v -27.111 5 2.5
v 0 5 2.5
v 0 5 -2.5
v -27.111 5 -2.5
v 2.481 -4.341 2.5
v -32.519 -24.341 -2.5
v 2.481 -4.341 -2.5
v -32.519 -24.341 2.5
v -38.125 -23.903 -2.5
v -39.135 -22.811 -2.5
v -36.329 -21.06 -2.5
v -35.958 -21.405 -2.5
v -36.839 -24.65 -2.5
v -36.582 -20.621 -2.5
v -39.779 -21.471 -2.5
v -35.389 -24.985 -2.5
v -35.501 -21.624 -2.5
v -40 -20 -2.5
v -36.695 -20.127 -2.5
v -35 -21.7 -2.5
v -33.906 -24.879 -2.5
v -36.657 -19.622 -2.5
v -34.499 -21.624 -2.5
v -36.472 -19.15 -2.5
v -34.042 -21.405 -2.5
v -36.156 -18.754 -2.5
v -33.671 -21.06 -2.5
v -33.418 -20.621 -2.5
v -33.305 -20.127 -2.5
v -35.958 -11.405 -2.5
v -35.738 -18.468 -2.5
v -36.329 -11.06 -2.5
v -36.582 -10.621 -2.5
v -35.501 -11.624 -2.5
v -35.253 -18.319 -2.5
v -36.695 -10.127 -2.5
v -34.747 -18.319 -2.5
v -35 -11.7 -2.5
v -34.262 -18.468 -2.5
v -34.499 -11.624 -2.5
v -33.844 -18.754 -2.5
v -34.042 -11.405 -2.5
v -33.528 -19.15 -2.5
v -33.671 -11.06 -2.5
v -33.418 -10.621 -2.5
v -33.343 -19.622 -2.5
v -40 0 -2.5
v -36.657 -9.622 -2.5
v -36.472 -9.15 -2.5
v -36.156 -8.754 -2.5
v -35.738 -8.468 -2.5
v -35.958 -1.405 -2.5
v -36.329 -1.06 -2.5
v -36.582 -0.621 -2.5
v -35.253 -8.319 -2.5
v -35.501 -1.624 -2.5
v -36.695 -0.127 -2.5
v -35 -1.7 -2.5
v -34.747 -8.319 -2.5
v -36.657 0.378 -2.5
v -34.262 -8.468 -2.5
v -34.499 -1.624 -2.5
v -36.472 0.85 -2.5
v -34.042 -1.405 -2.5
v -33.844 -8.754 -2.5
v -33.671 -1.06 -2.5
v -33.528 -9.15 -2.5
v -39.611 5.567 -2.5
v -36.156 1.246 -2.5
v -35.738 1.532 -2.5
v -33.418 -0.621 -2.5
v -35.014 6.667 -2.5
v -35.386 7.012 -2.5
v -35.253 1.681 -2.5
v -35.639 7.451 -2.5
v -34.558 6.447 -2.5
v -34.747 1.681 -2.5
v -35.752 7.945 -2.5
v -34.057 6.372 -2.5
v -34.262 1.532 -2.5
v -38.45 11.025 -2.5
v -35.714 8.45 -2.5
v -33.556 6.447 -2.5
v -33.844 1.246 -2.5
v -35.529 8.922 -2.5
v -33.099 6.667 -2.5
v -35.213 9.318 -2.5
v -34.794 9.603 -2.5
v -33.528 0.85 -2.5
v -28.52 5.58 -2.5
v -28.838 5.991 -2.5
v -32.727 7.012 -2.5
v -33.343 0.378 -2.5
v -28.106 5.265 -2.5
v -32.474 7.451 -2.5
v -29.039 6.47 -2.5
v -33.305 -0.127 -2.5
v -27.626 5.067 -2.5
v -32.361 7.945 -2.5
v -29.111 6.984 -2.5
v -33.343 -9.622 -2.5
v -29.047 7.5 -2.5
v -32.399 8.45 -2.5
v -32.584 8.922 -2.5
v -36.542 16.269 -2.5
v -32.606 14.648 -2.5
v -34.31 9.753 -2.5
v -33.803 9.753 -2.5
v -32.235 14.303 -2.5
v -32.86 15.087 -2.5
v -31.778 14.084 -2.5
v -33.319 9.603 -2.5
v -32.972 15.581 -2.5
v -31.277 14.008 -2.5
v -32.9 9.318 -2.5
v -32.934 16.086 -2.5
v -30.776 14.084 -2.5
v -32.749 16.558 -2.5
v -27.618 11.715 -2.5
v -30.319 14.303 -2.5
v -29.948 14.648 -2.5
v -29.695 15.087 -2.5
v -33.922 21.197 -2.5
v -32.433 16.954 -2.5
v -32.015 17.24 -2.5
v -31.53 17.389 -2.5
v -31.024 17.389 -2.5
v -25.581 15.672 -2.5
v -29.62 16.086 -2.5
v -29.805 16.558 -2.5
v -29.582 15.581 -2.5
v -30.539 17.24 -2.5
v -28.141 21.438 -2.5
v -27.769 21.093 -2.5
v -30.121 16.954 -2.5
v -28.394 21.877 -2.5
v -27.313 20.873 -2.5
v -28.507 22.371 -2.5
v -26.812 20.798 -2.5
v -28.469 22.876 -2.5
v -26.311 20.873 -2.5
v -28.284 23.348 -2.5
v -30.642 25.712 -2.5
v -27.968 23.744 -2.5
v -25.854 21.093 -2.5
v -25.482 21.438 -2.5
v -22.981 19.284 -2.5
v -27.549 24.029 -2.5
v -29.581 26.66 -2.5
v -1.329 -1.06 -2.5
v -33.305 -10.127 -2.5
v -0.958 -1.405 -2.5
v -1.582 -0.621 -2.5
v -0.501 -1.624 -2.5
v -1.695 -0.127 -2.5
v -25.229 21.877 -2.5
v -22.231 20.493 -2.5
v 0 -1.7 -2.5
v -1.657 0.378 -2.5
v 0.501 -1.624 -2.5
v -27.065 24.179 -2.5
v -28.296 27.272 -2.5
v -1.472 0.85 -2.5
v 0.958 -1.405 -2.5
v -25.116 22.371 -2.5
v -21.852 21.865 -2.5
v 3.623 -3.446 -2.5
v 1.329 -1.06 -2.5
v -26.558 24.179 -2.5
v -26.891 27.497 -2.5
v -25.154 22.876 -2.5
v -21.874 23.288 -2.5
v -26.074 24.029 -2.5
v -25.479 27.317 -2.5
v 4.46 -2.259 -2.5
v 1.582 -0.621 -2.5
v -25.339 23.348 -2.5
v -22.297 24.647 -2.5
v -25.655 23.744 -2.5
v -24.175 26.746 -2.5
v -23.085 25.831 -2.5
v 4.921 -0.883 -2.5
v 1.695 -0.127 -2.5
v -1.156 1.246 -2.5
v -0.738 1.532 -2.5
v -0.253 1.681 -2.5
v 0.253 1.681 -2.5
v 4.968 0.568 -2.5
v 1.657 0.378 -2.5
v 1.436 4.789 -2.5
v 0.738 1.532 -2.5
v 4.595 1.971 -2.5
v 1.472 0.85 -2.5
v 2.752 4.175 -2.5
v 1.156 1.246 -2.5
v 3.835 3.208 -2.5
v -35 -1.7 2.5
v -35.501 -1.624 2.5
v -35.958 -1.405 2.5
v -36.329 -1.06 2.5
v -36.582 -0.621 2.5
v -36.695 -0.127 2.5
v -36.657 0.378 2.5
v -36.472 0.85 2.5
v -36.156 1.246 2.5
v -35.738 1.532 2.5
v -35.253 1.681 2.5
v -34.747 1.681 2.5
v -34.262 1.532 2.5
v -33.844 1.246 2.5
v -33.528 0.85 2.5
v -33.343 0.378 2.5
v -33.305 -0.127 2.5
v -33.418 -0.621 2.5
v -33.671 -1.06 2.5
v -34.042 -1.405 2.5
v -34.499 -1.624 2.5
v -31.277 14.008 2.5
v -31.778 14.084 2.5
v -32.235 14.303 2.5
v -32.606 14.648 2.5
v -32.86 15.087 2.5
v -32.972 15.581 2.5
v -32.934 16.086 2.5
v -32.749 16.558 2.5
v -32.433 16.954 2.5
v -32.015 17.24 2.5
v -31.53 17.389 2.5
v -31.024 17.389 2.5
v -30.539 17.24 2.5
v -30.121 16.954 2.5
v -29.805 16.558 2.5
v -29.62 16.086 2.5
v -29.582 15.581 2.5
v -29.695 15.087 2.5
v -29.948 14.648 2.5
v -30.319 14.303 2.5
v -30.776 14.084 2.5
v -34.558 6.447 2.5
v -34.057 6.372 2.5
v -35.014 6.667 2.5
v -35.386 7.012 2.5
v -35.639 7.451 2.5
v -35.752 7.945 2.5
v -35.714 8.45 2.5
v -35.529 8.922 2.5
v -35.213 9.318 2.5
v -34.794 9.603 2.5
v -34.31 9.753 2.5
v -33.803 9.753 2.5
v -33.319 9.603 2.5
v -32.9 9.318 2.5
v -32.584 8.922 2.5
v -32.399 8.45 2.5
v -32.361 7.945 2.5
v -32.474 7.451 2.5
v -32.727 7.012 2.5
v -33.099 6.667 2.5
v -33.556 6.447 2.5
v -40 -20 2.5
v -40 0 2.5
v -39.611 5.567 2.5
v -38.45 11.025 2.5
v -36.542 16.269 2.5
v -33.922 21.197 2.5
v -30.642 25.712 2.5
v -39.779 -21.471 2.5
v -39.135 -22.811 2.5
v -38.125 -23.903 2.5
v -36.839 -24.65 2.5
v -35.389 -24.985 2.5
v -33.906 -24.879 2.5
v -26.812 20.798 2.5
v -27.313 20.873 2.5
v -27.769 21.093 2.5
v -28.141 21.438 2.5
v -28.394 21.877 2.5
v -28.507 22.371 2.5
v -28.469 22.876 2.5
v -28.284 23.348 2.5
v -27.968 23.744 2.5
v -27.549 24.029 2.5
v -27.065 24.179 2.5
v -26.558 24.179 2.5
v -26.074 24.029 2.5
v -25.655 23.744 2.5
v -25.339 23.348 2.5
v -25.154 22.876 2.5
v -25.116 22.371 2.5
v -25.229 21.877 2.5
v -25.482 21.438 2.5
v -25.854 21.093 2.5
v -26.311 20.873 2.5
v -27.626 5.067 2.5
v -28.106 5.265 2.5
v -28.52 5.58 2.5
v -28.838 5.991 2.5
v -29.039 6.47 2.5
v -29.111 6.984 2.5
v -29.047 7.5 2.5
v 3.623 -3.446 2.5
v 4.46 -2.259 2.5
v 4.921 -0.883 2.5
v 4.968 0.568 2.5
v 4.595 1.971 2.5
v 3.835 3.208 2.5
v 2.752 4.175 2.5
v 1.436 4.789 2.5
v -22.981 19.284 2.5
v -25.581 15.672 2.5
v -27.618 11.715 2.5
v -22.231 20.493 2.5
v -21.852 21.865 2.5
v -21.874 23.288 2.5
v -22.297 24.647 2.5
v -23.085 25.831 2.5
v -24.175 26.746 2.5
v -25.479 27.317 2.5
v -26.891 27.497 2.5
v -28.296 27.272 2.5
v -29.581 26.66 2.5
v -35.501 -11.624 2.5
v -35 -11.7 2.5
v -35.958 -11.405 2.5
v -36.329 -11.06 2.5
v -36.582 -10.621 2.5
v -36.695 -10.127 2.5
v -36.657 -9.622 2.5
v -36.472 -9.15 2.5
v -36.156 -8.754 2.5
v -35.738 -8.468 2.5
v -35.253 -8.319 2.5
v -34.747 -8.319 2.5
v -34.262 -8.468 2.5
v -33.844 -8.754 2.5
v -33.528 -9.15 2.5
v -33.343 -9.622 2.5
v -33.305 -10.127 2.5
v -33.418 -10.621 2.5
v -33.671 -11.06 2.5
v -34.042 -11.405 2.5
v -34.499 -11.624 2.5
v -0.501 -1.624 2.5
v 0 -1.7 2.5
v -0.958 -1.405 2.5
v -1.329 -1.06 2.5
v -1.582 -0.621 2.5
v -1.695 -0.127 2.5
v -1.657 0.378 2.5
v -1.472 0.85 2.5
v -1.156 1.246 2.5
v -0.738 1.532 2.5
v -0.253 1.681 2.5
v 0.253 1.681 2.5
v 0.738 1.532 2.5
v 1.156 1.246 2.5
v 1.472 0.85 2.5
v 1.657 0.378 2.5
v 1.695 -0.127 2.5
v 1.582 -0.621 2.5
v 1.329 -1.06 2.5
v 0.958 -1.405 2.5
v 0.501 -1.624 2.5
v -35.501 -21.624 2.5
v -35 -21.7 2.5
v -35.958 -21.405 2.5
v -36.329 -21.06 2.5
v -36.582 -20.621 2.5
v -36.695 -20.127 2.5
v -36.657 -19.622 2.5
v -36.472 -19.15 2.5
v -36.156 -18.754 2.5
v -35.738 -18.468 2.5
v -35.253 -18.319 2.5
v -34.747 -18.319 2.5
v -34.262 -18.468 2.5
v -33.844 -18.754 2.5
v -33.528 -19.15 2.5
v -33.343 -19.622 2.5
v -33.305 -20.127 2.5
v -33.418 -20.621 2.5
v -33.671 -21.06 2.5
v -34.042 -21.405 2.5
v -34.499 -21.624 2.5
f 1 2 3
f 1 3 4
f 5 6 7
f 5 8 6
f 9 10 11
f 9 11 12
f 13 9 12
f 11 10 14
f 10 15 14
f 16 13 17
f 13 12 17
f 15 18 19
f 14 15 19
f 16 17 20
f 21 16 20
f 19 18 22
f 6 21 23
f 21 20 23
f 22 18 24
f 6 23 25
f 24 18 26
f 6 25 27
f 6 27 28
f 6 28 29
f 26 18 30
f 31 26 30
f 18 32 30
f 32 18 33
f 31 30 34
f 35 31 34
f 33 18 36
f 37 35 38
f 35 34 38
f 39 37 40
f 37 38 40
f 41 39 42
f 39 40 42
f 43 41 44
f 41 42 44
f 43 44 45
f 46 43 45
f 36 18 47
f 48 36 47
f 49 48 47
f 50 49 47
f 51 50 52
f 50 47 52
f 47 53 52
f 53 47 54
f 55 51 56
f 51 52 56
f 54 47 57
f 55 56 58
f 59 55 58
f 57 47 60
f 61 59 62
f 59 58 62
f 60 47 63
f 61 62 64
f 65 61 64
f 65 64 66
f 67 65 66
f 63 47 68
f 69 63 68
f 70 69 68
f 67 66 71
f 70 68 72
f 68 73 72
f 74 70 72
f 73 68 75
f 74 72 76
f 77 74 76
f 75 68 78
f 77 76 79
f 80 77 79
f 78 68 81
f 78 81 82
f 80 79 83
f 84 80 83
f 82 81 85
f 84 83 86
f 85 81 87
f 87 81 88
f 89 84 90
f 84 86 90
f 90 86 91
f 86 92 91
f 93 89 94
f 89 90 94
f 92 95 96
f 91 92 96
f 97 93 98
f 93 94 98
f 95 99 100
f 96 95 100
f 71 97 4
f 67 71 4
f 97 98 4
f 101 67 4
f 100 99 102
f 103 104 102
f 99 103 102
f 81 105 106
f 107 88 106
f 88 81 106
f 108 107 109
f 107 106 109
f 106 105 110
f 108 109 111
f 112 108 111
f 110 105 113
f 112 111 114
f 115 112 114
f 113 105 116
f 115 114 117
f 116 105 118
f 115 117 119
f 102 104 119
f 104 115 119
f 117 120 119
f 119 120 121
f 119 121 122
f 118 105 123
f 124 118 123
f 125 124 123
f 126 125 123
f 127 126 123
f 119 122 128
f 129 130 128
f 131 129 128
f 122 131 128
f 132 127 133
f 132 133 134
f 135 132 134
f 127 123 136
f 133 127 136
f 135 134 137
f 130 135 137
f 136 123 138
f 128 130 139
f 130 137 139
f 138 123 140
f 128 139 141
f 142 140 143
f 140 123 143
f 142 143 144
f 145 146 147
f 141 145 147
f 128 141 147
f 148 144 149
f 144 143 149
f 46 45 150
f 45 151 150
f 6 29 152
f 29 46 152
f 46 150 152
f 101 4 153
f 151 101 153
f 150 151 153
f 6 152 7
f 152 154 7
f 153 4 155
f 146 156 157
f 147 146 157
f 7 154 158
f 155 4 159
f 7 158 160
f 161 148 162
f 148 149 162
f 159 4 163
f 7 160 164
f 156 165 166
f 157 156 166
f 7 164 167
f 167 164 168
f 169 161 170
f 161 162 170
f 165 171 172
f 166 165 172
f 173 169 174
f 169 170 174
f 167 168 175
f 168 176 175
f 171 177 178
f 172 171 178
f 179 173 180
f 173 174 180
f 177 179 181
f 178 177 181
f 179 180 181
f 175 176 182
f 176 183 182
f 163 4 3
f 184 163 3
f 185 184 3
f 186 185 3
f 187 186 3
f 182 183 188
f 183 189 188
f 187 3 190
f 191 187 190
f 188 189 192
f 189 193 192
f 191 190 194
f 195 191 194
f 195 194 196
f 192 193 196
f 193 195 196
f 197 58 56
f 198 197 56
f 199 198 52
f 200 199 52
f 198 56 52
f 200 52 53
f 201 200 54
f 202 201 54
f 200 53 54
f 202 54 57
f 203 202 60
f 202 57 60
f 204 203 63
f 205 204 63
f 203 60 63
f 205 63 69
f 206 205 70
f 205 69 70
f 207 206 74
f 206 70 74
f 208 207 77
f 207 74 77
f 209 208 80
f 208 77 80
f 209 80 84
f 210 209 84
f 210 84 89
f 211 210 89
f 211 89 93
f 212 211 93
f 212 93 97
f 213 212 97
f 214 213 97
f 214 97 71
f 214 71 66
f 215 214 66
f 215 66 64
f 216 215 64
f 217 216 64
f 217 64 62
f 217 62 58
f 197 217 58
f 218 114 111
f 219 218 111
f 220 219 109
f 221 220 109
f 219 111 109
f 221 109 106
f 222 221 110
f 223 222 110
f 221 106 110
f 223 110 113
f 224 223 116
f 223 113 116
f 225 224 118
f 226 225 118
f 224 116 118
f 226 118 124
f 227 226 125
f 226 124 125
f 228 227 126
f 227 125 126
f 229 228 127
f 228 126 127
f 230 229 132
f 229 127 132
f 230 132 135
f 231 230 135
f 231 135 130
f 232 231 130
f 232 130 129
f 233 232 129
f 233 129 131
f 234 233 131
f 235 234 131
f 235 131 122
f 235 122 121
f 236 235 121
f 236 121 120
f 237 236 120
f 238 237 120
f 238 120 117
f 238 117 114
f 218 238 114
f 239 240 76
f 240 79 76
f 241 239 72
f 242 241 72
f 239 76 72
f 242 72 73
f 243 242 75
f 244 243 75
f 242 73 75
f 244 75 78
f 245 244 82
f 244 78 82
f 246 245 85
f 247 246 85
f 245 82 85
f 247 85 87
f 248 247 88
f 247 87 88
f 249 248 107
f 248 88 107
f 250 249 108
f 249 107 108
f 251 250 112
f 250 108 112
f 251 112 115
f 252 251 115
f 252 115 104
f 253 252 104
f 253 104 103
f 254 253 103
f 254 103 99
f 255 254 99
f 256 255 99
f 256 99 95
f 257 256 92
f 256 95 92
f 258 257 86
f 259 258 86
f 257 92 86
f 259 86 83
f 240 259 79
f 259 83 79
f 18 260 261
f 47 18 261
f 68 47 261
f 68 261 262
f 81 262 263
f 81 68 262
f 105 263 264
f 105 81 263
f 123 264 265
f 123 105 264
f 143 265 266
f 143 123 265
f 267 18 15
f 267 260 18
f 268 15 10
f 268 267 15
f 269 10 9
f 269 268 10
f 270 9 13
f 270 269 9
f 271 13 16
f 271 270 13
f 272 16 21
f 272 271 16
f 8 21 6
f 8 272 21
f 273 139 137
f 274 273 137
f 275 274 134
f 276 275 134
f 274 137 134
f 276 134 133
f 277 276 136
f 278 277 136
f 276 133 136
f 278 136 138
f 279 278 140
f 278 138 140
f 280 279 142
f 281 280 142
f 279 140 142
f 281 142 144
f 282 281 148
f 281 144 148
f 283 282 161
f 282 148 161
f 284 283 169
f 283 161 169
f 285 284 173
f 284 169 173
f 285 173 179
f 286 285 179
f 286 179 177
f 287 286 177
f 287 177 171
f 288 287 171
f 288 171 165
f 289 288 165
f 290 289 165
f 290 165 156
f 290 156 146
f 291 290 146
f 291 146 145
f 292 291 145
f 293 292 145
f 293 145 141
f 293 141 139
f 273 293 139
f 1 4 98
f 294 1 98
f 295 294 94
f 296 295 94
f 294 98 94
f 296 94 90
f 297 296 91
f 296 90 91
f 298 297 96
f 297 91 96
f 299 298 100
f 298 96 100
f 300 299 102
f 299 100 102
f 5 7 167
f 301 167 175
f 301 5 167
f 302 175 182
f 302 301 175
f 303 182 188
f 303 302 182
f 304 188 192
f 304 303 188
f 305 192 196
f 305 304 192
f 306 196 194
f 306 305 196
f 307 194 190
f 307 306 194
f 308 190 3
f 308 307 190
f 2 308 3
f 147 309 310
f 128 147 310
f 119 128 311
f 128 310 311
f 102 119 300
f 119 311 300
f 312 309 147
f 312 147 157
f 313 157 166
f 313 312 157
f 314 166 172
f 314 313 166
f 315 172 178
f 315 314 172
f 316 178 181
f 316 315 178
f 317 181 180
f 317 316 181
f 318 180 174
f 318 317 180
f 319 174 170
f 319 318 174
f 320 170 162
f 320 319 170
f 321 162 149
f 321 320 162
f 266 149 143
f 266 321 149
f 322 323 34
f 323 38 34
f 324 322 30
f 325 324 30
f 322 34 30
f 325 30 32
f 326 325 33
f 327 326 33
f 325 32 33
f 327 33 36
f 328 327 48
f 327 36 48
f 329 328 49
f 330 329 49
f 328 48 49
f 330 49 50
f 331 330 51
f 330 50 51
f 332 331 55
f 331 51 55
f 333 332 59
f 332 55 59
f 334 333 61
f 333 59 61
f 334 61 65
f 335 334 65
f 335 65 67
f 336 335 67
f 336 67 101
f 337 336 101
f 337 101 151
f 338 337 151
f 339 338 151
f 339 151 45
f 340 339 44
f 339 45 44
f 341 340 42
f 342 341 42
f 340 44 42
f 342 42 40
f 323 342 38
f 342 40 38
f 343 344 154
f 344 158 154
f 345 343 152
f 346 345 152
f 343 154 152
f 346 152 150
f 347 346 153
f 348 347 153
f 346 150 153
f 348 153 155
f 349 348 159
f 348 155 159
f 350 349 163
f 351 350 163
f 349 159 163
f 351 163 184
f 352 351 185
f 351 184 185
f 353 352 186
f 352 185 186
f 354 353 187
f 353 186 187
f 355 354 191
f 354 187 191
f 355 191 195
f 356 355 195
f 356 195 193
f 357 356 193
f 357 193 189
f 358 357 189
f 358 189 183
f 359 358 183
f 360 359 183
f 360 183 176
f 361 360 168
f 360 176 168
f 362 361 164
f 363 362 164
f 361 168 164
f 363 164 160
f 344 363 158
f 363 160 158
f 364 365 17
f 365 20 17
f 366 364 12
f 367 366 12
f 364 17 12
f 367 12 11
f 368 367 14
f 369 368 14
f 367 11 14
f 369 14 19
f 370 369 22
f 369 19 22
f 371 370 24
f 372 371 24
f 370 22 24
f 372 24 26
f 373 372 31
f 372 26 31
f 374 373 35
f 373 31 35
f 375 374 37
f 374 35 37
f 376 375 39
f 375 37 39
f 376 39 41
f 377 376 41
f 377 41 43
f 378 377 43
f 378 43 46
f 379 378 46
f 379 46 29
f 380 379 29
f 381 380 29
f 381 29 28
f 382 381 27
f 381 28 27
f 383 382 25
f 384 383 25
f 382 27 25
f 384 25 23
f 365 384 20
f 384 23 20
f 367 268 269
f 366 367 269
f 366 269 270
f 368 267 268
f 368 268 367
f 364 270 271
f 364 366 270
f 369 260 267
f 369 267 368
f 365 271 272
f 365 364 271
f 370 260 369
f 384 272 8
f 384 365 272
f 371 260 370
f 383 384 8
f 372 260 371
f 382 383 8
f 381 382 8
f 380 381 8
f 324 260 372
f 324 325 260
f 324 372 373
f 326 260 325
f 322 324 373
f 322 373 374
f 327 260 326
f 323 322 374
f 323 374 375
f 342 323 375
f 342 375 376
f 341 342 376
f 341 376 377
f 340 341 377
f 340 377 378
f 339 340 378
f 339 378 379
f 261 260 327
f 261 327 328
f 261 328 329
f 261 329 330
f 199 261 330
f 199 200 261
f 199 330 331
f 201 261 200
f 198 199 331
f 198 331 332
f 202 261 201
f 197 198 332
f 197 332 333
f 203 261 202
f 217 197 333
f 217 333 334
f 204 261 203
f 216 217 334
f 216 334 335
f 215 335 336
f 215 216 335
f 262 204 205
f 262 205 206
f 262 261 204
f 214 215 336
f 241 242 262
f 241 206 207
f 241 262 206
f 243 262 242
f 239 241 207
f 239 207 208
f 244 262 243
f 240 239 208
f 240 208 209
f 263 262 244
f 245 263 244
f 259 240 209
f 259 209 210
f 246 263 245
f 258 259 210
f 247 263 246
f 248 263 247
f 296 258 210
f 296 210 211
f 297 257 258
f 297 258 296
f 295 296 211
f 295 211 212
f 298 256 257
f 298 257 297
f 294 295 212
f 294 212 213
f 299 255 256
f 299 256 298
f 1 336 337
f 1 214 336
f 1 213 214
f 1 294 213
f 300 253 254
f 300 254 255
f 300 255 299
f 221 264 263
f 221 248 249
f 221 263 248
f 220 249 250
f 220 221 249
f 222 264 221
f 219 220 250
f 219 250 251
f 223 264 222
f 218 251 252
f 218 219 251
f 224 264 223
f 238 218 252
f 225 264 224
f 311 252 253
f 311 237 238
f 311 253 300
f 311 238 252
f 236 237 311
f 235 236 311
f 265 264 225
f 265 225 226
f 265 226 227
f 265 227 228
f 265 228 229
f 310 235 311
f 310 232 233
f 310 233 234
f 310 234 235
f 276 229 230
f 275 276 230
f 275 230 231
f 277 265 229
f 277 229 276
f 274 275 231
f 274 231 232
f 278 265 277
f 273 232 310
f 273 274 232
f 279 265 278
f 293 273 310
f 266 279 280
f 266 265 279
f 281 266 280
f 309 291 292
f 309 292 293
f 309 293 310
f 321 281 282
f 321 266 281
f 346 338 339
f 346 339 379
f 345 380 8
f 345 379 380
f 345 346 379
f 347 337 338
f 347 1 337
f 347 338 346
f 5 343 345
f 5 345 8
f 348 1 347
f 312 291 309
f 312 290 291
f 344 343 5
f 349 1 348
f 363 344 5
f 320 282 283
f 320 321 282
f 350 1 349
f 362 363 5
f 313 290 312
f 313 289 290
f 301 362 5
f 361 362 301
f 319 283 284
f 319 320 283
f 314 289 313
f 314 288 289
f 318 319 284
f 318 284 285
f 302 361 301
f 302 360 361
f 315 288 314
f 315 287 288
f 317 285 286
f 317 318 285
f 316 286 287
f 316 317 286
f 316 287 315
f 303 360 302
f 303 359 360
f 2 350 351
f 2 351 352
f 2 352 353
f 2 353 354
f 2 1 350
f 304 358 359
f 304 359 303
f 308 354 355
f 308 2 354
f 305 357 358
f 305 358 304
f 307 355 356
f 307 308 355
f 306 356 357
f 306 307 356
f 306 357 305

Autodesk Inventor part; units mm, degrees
ref_plane "YZ Plane" through (0, 0, 0) normal (1, 0, 0) x (0, 1, 0)
ref_plane "XZ Plane" through (0, 0, 0) normal (0, 1, 0) x (-1, 0, 0)
ref_plane "XY Plane" through (0, 0, 0) normal (0, 0, 1) x (1, 0, 0)
sketch "スケッチ1" plane through (0, 0, 0) normal (0, 0, 1) x (1, 0, 0)
  circle A0 centre (0, 0) radius 40
  line L0 (0, 0) -> (0, 40)
  line L1 (-40, 0) -> (0, 0)
  dimension "d0" = 80
extrude "押し出し1" add sketch "スケッチ1" along normal mid plane 5 contours L0 L1 A0 picked at (-23.4047, 12.51)
sketch "スケッチ2" plane through (0, 0, 2.5) normal (0, 0, 1) x (1, 0, 0)
  line L0 (0, 0) -> (0, 40) projected
  arc A0 (0, 40) -> (-40, 0) centre (0, 0) ccw projected
  line L1 (-40, 0) -> (0, 0) projected
  line L2 (-40, 0) -> (0, 0)
  line L3 (0, 0) -> (0, -5)
  line L4 (0, -5) -> (-40, -5)
  line L5 (-40, -5) -> (-40, 0)
  line L6 (0, -5) -> (5, -5)
  line L7 (5, -5) -> (5, 5)
  line L8 (5, 5) -> (0, 5)
  line L9 (0, 5) -> (0, -5)
  dimension "d3" = 5
  dimension "d4" = 5
  dimension "d5" = 10
extrude "押し出し2" add sketch "スケッチ2" against normal blind 5 contours L3 L4 L5 L1 | L0 L8 L7 L6 L3
sketch "スケッチ3" plane through (0, 0, 2.5) normal (0, 0, 1) x (1, 0, 0)
  circle A0 centre (0, 0) radius 35
  point P0 (-35, 0)
  point P1 (-34.0566, 8.0716)
  point P2 (-31.2771, 15.708)
  point P3 (-26.8116, 22.4976)
  dimension "d8" = 70
  dimension "d11" = 40
hole "穴1" at (0, 0, 2.5) at (-35, 0, 2.5) at (-34.0566, 8.0716, 2.5) at (-31.2771, 15.708, 2.5) at (-26.8116, 22.4976, 2.5) direction (0, 0, -1) diameter 3.4 end through all
sketch "スケッチ4" plane through (0, 0, 2.5) normal (0, 0, 1) x (1, 0, 0)
  arc A0 (-1.7, 0) -> (-1.7, 0) centre (0, 0) ccw projected
  circle A1 centre (0, 0) radius 30
  circle A2 centre (-26.8116, 22.4976) radius 1.7 projected
  circle A3 centre (-31.2771, 15.708) radius 1.7 projected
  circle A4 centre (-34.0566, 8.0716) radius 1.7 projected
  circle A5 centre (-35, 0) radius 1.7 projected
  circle A6 centre (0, 0) radius 1.7 projected
  line L0 (0, 5) -> (0, 40) projected
  arc A7 (0, 40) -> (-40, 0) centre (0, 0) ccw projected
  line L1 (-40, 0) -> (-40, -5) projected
  line L2 (-40, -5) -> (5, -5) projected
  line L3 (5, -5) -> (5, 5) projected
  line L4 (5, 5) -> (0, 5) projected
  line L5 (0, 0) -> (-30.6418, 25.7115)
  line L6 (-30.6418, 25.7115) -> (-22.9813, 19.2836)
  line L7 (-22.9813, 19.2836) -> (-19.7674, 23.1139)
  line L8 (-19.7674, 23.1139) -> (-27.4278, 29.5417)
  line L9 (-27.4278, 29.5417) -> (-30.6418, 25.7115)
  line L10 (0, 5) -> (-29.5804, 5)
  point P0 (-27.1875, 29.3401)
  dimension "d20" = 60
  dimension "d21" = 40
  dimension "d22" = 5
extrude "押し出し3" cut sketch "スケッチ4" against normal blind 55 contours L10 A1 L5 | L5 A1 L0 L10 | L7 L8 A7 L0 A1
sketch "スケッチ7" plane through (0, 0, 2.5) normal (0, 0, 1) x (1, 0, 0)
  line L0 (-40, -5) -> (5, -5) projected
  line L1 (-40, -5) -> (-30, -5)
  line L2 (-30, -5) -> (-30, -25)
  line L3 (-30, -25) -> (-40, -25)
  line L4 (-40, -25) -> (-40, -5)
  line L5 (-30, -25) -> (5, -5)
  point P0 (0, 0)
  dimension "d40" = 10
  dimension "d41" = 20
extrude "押し出し5" add sketch "スケッチ7" against normal blind 5
sketch "スケッチ8" plane through (0, 0, 2.5) normal (0, 0, 1) x (1, 0, 0)
  line L0 (-40, 0) -> (-40, -25) projected
  line L1 (-40, -25) -> (-30, -25) projected
  point P0 (0, 0)
  point P1 (-35, -10)
  point P2 (-35, -20)
  dimension "d44" = 5
  dimension "d45" = 5
  dimension "d46" = 10
  dimension "d47" = 5
hole "穴3" at (-35, -20, 2.5) at (-35, -10, 2.5) direction (0, 0, -1) diameter 3.4 end through all
sketch "スケッチ9" plane through (0, 0, 2.5) normal (0, 0, 1) x (1, 0, 0)
  circle A0 centre (0, 0) radius 1.7 projected
  circle A1 centre (0, 0) radius 5
  line L0 (-29.5804, 5) -> (5, 5) projected
  circle A2 centre (-35, -20) radius 1.7 projected
  circle A3 centre (-35, -20) radius 5
  line L1 (-40, -25) -> (-40, 0) projected
  line L2 (-35, -20) -> (0, 0) construction
  line L3 (-32.5193, -24.3412) -> (2.4807, -4.3412)
  line L4 (-2.4807, 4.3412) -> (-37.4807, -15.6588)
  arc A4 (-37.4807, -15.6588) -> (-32.5193, -24.3412) centre (-35, -20) ccw
  arc A5 (2.4807, -4.3412) -> (-2.4807, 4.3412) centre (0, 0) ccw
  circle A6 centre (-35, -10) radius 1.7 projected
  circle A7 centre (-35, -20) radius 1.7 projected
  line L5 (-19.7674, 23.1139) -> (-27.1875, 29.3401) projected
  arc A8 (-27.1875, 29.3401) -> (-40, 0) centre (0, 0) ccw projected
  line L6 (-40, 0) -> (-40, -25) projected
  line L7 (-40, -25) -> (-30, -25) projected
  line L8 (-30, -25) -> (5, -5) projected
  line L9 (5, -5) -> (5, 5) projected
  line L10 (5, 5) -> (-29.5804, 5) projected
  arc A9 (-22.9813, 19.2836) -> (-29.5804, 5) centre (0, 0) ccw projected
  line L11 (-22.9813, 19.2836) -> (-19.7674, 23.1139) projected
  circle A10 centre (-26.8116, 22.4976) radius 1.7 projected
  circle A11 centre (-31.2771, 15.708) radius 1.7 projected
  circle A12 centre (-34.0566, 8.0716) radius 1.7 projected
  circle A13 centre (-35, 0) radius 1.7 projected
  circle A14 centre (0, 0) radius 1.7 projected
  circle A15 centre (-26.8116, 22.4976) radius 5
  point P0 (-17.5, -10)
  point P1 (5, 0)
  point P2 (2.4807, -4.3412)
  point P3 (-35, -25)
  point P4 (0, 5)
  point P5 (-40, -20)
  point P6 (-22.9813, 19.2836)
  point P7 (-23.5976, 26.3278)
  point P8 (-30.6418, 25.7115)
extrude "押し出し6" cut sketch "スケッチ9" against normal blind 5 contours A1 L9 L8 L7 A3 L3 | L0 L9 A1 | A3 L7 L1 | A15 L5 L11 | A8 L5 A15
fillet "フィレット1" radius 2 1 edges at (-29.5804, 5, 0)
equation "\"d45\" = d44"
equation "\"d47\" = d44"
properties part number "side_part"
